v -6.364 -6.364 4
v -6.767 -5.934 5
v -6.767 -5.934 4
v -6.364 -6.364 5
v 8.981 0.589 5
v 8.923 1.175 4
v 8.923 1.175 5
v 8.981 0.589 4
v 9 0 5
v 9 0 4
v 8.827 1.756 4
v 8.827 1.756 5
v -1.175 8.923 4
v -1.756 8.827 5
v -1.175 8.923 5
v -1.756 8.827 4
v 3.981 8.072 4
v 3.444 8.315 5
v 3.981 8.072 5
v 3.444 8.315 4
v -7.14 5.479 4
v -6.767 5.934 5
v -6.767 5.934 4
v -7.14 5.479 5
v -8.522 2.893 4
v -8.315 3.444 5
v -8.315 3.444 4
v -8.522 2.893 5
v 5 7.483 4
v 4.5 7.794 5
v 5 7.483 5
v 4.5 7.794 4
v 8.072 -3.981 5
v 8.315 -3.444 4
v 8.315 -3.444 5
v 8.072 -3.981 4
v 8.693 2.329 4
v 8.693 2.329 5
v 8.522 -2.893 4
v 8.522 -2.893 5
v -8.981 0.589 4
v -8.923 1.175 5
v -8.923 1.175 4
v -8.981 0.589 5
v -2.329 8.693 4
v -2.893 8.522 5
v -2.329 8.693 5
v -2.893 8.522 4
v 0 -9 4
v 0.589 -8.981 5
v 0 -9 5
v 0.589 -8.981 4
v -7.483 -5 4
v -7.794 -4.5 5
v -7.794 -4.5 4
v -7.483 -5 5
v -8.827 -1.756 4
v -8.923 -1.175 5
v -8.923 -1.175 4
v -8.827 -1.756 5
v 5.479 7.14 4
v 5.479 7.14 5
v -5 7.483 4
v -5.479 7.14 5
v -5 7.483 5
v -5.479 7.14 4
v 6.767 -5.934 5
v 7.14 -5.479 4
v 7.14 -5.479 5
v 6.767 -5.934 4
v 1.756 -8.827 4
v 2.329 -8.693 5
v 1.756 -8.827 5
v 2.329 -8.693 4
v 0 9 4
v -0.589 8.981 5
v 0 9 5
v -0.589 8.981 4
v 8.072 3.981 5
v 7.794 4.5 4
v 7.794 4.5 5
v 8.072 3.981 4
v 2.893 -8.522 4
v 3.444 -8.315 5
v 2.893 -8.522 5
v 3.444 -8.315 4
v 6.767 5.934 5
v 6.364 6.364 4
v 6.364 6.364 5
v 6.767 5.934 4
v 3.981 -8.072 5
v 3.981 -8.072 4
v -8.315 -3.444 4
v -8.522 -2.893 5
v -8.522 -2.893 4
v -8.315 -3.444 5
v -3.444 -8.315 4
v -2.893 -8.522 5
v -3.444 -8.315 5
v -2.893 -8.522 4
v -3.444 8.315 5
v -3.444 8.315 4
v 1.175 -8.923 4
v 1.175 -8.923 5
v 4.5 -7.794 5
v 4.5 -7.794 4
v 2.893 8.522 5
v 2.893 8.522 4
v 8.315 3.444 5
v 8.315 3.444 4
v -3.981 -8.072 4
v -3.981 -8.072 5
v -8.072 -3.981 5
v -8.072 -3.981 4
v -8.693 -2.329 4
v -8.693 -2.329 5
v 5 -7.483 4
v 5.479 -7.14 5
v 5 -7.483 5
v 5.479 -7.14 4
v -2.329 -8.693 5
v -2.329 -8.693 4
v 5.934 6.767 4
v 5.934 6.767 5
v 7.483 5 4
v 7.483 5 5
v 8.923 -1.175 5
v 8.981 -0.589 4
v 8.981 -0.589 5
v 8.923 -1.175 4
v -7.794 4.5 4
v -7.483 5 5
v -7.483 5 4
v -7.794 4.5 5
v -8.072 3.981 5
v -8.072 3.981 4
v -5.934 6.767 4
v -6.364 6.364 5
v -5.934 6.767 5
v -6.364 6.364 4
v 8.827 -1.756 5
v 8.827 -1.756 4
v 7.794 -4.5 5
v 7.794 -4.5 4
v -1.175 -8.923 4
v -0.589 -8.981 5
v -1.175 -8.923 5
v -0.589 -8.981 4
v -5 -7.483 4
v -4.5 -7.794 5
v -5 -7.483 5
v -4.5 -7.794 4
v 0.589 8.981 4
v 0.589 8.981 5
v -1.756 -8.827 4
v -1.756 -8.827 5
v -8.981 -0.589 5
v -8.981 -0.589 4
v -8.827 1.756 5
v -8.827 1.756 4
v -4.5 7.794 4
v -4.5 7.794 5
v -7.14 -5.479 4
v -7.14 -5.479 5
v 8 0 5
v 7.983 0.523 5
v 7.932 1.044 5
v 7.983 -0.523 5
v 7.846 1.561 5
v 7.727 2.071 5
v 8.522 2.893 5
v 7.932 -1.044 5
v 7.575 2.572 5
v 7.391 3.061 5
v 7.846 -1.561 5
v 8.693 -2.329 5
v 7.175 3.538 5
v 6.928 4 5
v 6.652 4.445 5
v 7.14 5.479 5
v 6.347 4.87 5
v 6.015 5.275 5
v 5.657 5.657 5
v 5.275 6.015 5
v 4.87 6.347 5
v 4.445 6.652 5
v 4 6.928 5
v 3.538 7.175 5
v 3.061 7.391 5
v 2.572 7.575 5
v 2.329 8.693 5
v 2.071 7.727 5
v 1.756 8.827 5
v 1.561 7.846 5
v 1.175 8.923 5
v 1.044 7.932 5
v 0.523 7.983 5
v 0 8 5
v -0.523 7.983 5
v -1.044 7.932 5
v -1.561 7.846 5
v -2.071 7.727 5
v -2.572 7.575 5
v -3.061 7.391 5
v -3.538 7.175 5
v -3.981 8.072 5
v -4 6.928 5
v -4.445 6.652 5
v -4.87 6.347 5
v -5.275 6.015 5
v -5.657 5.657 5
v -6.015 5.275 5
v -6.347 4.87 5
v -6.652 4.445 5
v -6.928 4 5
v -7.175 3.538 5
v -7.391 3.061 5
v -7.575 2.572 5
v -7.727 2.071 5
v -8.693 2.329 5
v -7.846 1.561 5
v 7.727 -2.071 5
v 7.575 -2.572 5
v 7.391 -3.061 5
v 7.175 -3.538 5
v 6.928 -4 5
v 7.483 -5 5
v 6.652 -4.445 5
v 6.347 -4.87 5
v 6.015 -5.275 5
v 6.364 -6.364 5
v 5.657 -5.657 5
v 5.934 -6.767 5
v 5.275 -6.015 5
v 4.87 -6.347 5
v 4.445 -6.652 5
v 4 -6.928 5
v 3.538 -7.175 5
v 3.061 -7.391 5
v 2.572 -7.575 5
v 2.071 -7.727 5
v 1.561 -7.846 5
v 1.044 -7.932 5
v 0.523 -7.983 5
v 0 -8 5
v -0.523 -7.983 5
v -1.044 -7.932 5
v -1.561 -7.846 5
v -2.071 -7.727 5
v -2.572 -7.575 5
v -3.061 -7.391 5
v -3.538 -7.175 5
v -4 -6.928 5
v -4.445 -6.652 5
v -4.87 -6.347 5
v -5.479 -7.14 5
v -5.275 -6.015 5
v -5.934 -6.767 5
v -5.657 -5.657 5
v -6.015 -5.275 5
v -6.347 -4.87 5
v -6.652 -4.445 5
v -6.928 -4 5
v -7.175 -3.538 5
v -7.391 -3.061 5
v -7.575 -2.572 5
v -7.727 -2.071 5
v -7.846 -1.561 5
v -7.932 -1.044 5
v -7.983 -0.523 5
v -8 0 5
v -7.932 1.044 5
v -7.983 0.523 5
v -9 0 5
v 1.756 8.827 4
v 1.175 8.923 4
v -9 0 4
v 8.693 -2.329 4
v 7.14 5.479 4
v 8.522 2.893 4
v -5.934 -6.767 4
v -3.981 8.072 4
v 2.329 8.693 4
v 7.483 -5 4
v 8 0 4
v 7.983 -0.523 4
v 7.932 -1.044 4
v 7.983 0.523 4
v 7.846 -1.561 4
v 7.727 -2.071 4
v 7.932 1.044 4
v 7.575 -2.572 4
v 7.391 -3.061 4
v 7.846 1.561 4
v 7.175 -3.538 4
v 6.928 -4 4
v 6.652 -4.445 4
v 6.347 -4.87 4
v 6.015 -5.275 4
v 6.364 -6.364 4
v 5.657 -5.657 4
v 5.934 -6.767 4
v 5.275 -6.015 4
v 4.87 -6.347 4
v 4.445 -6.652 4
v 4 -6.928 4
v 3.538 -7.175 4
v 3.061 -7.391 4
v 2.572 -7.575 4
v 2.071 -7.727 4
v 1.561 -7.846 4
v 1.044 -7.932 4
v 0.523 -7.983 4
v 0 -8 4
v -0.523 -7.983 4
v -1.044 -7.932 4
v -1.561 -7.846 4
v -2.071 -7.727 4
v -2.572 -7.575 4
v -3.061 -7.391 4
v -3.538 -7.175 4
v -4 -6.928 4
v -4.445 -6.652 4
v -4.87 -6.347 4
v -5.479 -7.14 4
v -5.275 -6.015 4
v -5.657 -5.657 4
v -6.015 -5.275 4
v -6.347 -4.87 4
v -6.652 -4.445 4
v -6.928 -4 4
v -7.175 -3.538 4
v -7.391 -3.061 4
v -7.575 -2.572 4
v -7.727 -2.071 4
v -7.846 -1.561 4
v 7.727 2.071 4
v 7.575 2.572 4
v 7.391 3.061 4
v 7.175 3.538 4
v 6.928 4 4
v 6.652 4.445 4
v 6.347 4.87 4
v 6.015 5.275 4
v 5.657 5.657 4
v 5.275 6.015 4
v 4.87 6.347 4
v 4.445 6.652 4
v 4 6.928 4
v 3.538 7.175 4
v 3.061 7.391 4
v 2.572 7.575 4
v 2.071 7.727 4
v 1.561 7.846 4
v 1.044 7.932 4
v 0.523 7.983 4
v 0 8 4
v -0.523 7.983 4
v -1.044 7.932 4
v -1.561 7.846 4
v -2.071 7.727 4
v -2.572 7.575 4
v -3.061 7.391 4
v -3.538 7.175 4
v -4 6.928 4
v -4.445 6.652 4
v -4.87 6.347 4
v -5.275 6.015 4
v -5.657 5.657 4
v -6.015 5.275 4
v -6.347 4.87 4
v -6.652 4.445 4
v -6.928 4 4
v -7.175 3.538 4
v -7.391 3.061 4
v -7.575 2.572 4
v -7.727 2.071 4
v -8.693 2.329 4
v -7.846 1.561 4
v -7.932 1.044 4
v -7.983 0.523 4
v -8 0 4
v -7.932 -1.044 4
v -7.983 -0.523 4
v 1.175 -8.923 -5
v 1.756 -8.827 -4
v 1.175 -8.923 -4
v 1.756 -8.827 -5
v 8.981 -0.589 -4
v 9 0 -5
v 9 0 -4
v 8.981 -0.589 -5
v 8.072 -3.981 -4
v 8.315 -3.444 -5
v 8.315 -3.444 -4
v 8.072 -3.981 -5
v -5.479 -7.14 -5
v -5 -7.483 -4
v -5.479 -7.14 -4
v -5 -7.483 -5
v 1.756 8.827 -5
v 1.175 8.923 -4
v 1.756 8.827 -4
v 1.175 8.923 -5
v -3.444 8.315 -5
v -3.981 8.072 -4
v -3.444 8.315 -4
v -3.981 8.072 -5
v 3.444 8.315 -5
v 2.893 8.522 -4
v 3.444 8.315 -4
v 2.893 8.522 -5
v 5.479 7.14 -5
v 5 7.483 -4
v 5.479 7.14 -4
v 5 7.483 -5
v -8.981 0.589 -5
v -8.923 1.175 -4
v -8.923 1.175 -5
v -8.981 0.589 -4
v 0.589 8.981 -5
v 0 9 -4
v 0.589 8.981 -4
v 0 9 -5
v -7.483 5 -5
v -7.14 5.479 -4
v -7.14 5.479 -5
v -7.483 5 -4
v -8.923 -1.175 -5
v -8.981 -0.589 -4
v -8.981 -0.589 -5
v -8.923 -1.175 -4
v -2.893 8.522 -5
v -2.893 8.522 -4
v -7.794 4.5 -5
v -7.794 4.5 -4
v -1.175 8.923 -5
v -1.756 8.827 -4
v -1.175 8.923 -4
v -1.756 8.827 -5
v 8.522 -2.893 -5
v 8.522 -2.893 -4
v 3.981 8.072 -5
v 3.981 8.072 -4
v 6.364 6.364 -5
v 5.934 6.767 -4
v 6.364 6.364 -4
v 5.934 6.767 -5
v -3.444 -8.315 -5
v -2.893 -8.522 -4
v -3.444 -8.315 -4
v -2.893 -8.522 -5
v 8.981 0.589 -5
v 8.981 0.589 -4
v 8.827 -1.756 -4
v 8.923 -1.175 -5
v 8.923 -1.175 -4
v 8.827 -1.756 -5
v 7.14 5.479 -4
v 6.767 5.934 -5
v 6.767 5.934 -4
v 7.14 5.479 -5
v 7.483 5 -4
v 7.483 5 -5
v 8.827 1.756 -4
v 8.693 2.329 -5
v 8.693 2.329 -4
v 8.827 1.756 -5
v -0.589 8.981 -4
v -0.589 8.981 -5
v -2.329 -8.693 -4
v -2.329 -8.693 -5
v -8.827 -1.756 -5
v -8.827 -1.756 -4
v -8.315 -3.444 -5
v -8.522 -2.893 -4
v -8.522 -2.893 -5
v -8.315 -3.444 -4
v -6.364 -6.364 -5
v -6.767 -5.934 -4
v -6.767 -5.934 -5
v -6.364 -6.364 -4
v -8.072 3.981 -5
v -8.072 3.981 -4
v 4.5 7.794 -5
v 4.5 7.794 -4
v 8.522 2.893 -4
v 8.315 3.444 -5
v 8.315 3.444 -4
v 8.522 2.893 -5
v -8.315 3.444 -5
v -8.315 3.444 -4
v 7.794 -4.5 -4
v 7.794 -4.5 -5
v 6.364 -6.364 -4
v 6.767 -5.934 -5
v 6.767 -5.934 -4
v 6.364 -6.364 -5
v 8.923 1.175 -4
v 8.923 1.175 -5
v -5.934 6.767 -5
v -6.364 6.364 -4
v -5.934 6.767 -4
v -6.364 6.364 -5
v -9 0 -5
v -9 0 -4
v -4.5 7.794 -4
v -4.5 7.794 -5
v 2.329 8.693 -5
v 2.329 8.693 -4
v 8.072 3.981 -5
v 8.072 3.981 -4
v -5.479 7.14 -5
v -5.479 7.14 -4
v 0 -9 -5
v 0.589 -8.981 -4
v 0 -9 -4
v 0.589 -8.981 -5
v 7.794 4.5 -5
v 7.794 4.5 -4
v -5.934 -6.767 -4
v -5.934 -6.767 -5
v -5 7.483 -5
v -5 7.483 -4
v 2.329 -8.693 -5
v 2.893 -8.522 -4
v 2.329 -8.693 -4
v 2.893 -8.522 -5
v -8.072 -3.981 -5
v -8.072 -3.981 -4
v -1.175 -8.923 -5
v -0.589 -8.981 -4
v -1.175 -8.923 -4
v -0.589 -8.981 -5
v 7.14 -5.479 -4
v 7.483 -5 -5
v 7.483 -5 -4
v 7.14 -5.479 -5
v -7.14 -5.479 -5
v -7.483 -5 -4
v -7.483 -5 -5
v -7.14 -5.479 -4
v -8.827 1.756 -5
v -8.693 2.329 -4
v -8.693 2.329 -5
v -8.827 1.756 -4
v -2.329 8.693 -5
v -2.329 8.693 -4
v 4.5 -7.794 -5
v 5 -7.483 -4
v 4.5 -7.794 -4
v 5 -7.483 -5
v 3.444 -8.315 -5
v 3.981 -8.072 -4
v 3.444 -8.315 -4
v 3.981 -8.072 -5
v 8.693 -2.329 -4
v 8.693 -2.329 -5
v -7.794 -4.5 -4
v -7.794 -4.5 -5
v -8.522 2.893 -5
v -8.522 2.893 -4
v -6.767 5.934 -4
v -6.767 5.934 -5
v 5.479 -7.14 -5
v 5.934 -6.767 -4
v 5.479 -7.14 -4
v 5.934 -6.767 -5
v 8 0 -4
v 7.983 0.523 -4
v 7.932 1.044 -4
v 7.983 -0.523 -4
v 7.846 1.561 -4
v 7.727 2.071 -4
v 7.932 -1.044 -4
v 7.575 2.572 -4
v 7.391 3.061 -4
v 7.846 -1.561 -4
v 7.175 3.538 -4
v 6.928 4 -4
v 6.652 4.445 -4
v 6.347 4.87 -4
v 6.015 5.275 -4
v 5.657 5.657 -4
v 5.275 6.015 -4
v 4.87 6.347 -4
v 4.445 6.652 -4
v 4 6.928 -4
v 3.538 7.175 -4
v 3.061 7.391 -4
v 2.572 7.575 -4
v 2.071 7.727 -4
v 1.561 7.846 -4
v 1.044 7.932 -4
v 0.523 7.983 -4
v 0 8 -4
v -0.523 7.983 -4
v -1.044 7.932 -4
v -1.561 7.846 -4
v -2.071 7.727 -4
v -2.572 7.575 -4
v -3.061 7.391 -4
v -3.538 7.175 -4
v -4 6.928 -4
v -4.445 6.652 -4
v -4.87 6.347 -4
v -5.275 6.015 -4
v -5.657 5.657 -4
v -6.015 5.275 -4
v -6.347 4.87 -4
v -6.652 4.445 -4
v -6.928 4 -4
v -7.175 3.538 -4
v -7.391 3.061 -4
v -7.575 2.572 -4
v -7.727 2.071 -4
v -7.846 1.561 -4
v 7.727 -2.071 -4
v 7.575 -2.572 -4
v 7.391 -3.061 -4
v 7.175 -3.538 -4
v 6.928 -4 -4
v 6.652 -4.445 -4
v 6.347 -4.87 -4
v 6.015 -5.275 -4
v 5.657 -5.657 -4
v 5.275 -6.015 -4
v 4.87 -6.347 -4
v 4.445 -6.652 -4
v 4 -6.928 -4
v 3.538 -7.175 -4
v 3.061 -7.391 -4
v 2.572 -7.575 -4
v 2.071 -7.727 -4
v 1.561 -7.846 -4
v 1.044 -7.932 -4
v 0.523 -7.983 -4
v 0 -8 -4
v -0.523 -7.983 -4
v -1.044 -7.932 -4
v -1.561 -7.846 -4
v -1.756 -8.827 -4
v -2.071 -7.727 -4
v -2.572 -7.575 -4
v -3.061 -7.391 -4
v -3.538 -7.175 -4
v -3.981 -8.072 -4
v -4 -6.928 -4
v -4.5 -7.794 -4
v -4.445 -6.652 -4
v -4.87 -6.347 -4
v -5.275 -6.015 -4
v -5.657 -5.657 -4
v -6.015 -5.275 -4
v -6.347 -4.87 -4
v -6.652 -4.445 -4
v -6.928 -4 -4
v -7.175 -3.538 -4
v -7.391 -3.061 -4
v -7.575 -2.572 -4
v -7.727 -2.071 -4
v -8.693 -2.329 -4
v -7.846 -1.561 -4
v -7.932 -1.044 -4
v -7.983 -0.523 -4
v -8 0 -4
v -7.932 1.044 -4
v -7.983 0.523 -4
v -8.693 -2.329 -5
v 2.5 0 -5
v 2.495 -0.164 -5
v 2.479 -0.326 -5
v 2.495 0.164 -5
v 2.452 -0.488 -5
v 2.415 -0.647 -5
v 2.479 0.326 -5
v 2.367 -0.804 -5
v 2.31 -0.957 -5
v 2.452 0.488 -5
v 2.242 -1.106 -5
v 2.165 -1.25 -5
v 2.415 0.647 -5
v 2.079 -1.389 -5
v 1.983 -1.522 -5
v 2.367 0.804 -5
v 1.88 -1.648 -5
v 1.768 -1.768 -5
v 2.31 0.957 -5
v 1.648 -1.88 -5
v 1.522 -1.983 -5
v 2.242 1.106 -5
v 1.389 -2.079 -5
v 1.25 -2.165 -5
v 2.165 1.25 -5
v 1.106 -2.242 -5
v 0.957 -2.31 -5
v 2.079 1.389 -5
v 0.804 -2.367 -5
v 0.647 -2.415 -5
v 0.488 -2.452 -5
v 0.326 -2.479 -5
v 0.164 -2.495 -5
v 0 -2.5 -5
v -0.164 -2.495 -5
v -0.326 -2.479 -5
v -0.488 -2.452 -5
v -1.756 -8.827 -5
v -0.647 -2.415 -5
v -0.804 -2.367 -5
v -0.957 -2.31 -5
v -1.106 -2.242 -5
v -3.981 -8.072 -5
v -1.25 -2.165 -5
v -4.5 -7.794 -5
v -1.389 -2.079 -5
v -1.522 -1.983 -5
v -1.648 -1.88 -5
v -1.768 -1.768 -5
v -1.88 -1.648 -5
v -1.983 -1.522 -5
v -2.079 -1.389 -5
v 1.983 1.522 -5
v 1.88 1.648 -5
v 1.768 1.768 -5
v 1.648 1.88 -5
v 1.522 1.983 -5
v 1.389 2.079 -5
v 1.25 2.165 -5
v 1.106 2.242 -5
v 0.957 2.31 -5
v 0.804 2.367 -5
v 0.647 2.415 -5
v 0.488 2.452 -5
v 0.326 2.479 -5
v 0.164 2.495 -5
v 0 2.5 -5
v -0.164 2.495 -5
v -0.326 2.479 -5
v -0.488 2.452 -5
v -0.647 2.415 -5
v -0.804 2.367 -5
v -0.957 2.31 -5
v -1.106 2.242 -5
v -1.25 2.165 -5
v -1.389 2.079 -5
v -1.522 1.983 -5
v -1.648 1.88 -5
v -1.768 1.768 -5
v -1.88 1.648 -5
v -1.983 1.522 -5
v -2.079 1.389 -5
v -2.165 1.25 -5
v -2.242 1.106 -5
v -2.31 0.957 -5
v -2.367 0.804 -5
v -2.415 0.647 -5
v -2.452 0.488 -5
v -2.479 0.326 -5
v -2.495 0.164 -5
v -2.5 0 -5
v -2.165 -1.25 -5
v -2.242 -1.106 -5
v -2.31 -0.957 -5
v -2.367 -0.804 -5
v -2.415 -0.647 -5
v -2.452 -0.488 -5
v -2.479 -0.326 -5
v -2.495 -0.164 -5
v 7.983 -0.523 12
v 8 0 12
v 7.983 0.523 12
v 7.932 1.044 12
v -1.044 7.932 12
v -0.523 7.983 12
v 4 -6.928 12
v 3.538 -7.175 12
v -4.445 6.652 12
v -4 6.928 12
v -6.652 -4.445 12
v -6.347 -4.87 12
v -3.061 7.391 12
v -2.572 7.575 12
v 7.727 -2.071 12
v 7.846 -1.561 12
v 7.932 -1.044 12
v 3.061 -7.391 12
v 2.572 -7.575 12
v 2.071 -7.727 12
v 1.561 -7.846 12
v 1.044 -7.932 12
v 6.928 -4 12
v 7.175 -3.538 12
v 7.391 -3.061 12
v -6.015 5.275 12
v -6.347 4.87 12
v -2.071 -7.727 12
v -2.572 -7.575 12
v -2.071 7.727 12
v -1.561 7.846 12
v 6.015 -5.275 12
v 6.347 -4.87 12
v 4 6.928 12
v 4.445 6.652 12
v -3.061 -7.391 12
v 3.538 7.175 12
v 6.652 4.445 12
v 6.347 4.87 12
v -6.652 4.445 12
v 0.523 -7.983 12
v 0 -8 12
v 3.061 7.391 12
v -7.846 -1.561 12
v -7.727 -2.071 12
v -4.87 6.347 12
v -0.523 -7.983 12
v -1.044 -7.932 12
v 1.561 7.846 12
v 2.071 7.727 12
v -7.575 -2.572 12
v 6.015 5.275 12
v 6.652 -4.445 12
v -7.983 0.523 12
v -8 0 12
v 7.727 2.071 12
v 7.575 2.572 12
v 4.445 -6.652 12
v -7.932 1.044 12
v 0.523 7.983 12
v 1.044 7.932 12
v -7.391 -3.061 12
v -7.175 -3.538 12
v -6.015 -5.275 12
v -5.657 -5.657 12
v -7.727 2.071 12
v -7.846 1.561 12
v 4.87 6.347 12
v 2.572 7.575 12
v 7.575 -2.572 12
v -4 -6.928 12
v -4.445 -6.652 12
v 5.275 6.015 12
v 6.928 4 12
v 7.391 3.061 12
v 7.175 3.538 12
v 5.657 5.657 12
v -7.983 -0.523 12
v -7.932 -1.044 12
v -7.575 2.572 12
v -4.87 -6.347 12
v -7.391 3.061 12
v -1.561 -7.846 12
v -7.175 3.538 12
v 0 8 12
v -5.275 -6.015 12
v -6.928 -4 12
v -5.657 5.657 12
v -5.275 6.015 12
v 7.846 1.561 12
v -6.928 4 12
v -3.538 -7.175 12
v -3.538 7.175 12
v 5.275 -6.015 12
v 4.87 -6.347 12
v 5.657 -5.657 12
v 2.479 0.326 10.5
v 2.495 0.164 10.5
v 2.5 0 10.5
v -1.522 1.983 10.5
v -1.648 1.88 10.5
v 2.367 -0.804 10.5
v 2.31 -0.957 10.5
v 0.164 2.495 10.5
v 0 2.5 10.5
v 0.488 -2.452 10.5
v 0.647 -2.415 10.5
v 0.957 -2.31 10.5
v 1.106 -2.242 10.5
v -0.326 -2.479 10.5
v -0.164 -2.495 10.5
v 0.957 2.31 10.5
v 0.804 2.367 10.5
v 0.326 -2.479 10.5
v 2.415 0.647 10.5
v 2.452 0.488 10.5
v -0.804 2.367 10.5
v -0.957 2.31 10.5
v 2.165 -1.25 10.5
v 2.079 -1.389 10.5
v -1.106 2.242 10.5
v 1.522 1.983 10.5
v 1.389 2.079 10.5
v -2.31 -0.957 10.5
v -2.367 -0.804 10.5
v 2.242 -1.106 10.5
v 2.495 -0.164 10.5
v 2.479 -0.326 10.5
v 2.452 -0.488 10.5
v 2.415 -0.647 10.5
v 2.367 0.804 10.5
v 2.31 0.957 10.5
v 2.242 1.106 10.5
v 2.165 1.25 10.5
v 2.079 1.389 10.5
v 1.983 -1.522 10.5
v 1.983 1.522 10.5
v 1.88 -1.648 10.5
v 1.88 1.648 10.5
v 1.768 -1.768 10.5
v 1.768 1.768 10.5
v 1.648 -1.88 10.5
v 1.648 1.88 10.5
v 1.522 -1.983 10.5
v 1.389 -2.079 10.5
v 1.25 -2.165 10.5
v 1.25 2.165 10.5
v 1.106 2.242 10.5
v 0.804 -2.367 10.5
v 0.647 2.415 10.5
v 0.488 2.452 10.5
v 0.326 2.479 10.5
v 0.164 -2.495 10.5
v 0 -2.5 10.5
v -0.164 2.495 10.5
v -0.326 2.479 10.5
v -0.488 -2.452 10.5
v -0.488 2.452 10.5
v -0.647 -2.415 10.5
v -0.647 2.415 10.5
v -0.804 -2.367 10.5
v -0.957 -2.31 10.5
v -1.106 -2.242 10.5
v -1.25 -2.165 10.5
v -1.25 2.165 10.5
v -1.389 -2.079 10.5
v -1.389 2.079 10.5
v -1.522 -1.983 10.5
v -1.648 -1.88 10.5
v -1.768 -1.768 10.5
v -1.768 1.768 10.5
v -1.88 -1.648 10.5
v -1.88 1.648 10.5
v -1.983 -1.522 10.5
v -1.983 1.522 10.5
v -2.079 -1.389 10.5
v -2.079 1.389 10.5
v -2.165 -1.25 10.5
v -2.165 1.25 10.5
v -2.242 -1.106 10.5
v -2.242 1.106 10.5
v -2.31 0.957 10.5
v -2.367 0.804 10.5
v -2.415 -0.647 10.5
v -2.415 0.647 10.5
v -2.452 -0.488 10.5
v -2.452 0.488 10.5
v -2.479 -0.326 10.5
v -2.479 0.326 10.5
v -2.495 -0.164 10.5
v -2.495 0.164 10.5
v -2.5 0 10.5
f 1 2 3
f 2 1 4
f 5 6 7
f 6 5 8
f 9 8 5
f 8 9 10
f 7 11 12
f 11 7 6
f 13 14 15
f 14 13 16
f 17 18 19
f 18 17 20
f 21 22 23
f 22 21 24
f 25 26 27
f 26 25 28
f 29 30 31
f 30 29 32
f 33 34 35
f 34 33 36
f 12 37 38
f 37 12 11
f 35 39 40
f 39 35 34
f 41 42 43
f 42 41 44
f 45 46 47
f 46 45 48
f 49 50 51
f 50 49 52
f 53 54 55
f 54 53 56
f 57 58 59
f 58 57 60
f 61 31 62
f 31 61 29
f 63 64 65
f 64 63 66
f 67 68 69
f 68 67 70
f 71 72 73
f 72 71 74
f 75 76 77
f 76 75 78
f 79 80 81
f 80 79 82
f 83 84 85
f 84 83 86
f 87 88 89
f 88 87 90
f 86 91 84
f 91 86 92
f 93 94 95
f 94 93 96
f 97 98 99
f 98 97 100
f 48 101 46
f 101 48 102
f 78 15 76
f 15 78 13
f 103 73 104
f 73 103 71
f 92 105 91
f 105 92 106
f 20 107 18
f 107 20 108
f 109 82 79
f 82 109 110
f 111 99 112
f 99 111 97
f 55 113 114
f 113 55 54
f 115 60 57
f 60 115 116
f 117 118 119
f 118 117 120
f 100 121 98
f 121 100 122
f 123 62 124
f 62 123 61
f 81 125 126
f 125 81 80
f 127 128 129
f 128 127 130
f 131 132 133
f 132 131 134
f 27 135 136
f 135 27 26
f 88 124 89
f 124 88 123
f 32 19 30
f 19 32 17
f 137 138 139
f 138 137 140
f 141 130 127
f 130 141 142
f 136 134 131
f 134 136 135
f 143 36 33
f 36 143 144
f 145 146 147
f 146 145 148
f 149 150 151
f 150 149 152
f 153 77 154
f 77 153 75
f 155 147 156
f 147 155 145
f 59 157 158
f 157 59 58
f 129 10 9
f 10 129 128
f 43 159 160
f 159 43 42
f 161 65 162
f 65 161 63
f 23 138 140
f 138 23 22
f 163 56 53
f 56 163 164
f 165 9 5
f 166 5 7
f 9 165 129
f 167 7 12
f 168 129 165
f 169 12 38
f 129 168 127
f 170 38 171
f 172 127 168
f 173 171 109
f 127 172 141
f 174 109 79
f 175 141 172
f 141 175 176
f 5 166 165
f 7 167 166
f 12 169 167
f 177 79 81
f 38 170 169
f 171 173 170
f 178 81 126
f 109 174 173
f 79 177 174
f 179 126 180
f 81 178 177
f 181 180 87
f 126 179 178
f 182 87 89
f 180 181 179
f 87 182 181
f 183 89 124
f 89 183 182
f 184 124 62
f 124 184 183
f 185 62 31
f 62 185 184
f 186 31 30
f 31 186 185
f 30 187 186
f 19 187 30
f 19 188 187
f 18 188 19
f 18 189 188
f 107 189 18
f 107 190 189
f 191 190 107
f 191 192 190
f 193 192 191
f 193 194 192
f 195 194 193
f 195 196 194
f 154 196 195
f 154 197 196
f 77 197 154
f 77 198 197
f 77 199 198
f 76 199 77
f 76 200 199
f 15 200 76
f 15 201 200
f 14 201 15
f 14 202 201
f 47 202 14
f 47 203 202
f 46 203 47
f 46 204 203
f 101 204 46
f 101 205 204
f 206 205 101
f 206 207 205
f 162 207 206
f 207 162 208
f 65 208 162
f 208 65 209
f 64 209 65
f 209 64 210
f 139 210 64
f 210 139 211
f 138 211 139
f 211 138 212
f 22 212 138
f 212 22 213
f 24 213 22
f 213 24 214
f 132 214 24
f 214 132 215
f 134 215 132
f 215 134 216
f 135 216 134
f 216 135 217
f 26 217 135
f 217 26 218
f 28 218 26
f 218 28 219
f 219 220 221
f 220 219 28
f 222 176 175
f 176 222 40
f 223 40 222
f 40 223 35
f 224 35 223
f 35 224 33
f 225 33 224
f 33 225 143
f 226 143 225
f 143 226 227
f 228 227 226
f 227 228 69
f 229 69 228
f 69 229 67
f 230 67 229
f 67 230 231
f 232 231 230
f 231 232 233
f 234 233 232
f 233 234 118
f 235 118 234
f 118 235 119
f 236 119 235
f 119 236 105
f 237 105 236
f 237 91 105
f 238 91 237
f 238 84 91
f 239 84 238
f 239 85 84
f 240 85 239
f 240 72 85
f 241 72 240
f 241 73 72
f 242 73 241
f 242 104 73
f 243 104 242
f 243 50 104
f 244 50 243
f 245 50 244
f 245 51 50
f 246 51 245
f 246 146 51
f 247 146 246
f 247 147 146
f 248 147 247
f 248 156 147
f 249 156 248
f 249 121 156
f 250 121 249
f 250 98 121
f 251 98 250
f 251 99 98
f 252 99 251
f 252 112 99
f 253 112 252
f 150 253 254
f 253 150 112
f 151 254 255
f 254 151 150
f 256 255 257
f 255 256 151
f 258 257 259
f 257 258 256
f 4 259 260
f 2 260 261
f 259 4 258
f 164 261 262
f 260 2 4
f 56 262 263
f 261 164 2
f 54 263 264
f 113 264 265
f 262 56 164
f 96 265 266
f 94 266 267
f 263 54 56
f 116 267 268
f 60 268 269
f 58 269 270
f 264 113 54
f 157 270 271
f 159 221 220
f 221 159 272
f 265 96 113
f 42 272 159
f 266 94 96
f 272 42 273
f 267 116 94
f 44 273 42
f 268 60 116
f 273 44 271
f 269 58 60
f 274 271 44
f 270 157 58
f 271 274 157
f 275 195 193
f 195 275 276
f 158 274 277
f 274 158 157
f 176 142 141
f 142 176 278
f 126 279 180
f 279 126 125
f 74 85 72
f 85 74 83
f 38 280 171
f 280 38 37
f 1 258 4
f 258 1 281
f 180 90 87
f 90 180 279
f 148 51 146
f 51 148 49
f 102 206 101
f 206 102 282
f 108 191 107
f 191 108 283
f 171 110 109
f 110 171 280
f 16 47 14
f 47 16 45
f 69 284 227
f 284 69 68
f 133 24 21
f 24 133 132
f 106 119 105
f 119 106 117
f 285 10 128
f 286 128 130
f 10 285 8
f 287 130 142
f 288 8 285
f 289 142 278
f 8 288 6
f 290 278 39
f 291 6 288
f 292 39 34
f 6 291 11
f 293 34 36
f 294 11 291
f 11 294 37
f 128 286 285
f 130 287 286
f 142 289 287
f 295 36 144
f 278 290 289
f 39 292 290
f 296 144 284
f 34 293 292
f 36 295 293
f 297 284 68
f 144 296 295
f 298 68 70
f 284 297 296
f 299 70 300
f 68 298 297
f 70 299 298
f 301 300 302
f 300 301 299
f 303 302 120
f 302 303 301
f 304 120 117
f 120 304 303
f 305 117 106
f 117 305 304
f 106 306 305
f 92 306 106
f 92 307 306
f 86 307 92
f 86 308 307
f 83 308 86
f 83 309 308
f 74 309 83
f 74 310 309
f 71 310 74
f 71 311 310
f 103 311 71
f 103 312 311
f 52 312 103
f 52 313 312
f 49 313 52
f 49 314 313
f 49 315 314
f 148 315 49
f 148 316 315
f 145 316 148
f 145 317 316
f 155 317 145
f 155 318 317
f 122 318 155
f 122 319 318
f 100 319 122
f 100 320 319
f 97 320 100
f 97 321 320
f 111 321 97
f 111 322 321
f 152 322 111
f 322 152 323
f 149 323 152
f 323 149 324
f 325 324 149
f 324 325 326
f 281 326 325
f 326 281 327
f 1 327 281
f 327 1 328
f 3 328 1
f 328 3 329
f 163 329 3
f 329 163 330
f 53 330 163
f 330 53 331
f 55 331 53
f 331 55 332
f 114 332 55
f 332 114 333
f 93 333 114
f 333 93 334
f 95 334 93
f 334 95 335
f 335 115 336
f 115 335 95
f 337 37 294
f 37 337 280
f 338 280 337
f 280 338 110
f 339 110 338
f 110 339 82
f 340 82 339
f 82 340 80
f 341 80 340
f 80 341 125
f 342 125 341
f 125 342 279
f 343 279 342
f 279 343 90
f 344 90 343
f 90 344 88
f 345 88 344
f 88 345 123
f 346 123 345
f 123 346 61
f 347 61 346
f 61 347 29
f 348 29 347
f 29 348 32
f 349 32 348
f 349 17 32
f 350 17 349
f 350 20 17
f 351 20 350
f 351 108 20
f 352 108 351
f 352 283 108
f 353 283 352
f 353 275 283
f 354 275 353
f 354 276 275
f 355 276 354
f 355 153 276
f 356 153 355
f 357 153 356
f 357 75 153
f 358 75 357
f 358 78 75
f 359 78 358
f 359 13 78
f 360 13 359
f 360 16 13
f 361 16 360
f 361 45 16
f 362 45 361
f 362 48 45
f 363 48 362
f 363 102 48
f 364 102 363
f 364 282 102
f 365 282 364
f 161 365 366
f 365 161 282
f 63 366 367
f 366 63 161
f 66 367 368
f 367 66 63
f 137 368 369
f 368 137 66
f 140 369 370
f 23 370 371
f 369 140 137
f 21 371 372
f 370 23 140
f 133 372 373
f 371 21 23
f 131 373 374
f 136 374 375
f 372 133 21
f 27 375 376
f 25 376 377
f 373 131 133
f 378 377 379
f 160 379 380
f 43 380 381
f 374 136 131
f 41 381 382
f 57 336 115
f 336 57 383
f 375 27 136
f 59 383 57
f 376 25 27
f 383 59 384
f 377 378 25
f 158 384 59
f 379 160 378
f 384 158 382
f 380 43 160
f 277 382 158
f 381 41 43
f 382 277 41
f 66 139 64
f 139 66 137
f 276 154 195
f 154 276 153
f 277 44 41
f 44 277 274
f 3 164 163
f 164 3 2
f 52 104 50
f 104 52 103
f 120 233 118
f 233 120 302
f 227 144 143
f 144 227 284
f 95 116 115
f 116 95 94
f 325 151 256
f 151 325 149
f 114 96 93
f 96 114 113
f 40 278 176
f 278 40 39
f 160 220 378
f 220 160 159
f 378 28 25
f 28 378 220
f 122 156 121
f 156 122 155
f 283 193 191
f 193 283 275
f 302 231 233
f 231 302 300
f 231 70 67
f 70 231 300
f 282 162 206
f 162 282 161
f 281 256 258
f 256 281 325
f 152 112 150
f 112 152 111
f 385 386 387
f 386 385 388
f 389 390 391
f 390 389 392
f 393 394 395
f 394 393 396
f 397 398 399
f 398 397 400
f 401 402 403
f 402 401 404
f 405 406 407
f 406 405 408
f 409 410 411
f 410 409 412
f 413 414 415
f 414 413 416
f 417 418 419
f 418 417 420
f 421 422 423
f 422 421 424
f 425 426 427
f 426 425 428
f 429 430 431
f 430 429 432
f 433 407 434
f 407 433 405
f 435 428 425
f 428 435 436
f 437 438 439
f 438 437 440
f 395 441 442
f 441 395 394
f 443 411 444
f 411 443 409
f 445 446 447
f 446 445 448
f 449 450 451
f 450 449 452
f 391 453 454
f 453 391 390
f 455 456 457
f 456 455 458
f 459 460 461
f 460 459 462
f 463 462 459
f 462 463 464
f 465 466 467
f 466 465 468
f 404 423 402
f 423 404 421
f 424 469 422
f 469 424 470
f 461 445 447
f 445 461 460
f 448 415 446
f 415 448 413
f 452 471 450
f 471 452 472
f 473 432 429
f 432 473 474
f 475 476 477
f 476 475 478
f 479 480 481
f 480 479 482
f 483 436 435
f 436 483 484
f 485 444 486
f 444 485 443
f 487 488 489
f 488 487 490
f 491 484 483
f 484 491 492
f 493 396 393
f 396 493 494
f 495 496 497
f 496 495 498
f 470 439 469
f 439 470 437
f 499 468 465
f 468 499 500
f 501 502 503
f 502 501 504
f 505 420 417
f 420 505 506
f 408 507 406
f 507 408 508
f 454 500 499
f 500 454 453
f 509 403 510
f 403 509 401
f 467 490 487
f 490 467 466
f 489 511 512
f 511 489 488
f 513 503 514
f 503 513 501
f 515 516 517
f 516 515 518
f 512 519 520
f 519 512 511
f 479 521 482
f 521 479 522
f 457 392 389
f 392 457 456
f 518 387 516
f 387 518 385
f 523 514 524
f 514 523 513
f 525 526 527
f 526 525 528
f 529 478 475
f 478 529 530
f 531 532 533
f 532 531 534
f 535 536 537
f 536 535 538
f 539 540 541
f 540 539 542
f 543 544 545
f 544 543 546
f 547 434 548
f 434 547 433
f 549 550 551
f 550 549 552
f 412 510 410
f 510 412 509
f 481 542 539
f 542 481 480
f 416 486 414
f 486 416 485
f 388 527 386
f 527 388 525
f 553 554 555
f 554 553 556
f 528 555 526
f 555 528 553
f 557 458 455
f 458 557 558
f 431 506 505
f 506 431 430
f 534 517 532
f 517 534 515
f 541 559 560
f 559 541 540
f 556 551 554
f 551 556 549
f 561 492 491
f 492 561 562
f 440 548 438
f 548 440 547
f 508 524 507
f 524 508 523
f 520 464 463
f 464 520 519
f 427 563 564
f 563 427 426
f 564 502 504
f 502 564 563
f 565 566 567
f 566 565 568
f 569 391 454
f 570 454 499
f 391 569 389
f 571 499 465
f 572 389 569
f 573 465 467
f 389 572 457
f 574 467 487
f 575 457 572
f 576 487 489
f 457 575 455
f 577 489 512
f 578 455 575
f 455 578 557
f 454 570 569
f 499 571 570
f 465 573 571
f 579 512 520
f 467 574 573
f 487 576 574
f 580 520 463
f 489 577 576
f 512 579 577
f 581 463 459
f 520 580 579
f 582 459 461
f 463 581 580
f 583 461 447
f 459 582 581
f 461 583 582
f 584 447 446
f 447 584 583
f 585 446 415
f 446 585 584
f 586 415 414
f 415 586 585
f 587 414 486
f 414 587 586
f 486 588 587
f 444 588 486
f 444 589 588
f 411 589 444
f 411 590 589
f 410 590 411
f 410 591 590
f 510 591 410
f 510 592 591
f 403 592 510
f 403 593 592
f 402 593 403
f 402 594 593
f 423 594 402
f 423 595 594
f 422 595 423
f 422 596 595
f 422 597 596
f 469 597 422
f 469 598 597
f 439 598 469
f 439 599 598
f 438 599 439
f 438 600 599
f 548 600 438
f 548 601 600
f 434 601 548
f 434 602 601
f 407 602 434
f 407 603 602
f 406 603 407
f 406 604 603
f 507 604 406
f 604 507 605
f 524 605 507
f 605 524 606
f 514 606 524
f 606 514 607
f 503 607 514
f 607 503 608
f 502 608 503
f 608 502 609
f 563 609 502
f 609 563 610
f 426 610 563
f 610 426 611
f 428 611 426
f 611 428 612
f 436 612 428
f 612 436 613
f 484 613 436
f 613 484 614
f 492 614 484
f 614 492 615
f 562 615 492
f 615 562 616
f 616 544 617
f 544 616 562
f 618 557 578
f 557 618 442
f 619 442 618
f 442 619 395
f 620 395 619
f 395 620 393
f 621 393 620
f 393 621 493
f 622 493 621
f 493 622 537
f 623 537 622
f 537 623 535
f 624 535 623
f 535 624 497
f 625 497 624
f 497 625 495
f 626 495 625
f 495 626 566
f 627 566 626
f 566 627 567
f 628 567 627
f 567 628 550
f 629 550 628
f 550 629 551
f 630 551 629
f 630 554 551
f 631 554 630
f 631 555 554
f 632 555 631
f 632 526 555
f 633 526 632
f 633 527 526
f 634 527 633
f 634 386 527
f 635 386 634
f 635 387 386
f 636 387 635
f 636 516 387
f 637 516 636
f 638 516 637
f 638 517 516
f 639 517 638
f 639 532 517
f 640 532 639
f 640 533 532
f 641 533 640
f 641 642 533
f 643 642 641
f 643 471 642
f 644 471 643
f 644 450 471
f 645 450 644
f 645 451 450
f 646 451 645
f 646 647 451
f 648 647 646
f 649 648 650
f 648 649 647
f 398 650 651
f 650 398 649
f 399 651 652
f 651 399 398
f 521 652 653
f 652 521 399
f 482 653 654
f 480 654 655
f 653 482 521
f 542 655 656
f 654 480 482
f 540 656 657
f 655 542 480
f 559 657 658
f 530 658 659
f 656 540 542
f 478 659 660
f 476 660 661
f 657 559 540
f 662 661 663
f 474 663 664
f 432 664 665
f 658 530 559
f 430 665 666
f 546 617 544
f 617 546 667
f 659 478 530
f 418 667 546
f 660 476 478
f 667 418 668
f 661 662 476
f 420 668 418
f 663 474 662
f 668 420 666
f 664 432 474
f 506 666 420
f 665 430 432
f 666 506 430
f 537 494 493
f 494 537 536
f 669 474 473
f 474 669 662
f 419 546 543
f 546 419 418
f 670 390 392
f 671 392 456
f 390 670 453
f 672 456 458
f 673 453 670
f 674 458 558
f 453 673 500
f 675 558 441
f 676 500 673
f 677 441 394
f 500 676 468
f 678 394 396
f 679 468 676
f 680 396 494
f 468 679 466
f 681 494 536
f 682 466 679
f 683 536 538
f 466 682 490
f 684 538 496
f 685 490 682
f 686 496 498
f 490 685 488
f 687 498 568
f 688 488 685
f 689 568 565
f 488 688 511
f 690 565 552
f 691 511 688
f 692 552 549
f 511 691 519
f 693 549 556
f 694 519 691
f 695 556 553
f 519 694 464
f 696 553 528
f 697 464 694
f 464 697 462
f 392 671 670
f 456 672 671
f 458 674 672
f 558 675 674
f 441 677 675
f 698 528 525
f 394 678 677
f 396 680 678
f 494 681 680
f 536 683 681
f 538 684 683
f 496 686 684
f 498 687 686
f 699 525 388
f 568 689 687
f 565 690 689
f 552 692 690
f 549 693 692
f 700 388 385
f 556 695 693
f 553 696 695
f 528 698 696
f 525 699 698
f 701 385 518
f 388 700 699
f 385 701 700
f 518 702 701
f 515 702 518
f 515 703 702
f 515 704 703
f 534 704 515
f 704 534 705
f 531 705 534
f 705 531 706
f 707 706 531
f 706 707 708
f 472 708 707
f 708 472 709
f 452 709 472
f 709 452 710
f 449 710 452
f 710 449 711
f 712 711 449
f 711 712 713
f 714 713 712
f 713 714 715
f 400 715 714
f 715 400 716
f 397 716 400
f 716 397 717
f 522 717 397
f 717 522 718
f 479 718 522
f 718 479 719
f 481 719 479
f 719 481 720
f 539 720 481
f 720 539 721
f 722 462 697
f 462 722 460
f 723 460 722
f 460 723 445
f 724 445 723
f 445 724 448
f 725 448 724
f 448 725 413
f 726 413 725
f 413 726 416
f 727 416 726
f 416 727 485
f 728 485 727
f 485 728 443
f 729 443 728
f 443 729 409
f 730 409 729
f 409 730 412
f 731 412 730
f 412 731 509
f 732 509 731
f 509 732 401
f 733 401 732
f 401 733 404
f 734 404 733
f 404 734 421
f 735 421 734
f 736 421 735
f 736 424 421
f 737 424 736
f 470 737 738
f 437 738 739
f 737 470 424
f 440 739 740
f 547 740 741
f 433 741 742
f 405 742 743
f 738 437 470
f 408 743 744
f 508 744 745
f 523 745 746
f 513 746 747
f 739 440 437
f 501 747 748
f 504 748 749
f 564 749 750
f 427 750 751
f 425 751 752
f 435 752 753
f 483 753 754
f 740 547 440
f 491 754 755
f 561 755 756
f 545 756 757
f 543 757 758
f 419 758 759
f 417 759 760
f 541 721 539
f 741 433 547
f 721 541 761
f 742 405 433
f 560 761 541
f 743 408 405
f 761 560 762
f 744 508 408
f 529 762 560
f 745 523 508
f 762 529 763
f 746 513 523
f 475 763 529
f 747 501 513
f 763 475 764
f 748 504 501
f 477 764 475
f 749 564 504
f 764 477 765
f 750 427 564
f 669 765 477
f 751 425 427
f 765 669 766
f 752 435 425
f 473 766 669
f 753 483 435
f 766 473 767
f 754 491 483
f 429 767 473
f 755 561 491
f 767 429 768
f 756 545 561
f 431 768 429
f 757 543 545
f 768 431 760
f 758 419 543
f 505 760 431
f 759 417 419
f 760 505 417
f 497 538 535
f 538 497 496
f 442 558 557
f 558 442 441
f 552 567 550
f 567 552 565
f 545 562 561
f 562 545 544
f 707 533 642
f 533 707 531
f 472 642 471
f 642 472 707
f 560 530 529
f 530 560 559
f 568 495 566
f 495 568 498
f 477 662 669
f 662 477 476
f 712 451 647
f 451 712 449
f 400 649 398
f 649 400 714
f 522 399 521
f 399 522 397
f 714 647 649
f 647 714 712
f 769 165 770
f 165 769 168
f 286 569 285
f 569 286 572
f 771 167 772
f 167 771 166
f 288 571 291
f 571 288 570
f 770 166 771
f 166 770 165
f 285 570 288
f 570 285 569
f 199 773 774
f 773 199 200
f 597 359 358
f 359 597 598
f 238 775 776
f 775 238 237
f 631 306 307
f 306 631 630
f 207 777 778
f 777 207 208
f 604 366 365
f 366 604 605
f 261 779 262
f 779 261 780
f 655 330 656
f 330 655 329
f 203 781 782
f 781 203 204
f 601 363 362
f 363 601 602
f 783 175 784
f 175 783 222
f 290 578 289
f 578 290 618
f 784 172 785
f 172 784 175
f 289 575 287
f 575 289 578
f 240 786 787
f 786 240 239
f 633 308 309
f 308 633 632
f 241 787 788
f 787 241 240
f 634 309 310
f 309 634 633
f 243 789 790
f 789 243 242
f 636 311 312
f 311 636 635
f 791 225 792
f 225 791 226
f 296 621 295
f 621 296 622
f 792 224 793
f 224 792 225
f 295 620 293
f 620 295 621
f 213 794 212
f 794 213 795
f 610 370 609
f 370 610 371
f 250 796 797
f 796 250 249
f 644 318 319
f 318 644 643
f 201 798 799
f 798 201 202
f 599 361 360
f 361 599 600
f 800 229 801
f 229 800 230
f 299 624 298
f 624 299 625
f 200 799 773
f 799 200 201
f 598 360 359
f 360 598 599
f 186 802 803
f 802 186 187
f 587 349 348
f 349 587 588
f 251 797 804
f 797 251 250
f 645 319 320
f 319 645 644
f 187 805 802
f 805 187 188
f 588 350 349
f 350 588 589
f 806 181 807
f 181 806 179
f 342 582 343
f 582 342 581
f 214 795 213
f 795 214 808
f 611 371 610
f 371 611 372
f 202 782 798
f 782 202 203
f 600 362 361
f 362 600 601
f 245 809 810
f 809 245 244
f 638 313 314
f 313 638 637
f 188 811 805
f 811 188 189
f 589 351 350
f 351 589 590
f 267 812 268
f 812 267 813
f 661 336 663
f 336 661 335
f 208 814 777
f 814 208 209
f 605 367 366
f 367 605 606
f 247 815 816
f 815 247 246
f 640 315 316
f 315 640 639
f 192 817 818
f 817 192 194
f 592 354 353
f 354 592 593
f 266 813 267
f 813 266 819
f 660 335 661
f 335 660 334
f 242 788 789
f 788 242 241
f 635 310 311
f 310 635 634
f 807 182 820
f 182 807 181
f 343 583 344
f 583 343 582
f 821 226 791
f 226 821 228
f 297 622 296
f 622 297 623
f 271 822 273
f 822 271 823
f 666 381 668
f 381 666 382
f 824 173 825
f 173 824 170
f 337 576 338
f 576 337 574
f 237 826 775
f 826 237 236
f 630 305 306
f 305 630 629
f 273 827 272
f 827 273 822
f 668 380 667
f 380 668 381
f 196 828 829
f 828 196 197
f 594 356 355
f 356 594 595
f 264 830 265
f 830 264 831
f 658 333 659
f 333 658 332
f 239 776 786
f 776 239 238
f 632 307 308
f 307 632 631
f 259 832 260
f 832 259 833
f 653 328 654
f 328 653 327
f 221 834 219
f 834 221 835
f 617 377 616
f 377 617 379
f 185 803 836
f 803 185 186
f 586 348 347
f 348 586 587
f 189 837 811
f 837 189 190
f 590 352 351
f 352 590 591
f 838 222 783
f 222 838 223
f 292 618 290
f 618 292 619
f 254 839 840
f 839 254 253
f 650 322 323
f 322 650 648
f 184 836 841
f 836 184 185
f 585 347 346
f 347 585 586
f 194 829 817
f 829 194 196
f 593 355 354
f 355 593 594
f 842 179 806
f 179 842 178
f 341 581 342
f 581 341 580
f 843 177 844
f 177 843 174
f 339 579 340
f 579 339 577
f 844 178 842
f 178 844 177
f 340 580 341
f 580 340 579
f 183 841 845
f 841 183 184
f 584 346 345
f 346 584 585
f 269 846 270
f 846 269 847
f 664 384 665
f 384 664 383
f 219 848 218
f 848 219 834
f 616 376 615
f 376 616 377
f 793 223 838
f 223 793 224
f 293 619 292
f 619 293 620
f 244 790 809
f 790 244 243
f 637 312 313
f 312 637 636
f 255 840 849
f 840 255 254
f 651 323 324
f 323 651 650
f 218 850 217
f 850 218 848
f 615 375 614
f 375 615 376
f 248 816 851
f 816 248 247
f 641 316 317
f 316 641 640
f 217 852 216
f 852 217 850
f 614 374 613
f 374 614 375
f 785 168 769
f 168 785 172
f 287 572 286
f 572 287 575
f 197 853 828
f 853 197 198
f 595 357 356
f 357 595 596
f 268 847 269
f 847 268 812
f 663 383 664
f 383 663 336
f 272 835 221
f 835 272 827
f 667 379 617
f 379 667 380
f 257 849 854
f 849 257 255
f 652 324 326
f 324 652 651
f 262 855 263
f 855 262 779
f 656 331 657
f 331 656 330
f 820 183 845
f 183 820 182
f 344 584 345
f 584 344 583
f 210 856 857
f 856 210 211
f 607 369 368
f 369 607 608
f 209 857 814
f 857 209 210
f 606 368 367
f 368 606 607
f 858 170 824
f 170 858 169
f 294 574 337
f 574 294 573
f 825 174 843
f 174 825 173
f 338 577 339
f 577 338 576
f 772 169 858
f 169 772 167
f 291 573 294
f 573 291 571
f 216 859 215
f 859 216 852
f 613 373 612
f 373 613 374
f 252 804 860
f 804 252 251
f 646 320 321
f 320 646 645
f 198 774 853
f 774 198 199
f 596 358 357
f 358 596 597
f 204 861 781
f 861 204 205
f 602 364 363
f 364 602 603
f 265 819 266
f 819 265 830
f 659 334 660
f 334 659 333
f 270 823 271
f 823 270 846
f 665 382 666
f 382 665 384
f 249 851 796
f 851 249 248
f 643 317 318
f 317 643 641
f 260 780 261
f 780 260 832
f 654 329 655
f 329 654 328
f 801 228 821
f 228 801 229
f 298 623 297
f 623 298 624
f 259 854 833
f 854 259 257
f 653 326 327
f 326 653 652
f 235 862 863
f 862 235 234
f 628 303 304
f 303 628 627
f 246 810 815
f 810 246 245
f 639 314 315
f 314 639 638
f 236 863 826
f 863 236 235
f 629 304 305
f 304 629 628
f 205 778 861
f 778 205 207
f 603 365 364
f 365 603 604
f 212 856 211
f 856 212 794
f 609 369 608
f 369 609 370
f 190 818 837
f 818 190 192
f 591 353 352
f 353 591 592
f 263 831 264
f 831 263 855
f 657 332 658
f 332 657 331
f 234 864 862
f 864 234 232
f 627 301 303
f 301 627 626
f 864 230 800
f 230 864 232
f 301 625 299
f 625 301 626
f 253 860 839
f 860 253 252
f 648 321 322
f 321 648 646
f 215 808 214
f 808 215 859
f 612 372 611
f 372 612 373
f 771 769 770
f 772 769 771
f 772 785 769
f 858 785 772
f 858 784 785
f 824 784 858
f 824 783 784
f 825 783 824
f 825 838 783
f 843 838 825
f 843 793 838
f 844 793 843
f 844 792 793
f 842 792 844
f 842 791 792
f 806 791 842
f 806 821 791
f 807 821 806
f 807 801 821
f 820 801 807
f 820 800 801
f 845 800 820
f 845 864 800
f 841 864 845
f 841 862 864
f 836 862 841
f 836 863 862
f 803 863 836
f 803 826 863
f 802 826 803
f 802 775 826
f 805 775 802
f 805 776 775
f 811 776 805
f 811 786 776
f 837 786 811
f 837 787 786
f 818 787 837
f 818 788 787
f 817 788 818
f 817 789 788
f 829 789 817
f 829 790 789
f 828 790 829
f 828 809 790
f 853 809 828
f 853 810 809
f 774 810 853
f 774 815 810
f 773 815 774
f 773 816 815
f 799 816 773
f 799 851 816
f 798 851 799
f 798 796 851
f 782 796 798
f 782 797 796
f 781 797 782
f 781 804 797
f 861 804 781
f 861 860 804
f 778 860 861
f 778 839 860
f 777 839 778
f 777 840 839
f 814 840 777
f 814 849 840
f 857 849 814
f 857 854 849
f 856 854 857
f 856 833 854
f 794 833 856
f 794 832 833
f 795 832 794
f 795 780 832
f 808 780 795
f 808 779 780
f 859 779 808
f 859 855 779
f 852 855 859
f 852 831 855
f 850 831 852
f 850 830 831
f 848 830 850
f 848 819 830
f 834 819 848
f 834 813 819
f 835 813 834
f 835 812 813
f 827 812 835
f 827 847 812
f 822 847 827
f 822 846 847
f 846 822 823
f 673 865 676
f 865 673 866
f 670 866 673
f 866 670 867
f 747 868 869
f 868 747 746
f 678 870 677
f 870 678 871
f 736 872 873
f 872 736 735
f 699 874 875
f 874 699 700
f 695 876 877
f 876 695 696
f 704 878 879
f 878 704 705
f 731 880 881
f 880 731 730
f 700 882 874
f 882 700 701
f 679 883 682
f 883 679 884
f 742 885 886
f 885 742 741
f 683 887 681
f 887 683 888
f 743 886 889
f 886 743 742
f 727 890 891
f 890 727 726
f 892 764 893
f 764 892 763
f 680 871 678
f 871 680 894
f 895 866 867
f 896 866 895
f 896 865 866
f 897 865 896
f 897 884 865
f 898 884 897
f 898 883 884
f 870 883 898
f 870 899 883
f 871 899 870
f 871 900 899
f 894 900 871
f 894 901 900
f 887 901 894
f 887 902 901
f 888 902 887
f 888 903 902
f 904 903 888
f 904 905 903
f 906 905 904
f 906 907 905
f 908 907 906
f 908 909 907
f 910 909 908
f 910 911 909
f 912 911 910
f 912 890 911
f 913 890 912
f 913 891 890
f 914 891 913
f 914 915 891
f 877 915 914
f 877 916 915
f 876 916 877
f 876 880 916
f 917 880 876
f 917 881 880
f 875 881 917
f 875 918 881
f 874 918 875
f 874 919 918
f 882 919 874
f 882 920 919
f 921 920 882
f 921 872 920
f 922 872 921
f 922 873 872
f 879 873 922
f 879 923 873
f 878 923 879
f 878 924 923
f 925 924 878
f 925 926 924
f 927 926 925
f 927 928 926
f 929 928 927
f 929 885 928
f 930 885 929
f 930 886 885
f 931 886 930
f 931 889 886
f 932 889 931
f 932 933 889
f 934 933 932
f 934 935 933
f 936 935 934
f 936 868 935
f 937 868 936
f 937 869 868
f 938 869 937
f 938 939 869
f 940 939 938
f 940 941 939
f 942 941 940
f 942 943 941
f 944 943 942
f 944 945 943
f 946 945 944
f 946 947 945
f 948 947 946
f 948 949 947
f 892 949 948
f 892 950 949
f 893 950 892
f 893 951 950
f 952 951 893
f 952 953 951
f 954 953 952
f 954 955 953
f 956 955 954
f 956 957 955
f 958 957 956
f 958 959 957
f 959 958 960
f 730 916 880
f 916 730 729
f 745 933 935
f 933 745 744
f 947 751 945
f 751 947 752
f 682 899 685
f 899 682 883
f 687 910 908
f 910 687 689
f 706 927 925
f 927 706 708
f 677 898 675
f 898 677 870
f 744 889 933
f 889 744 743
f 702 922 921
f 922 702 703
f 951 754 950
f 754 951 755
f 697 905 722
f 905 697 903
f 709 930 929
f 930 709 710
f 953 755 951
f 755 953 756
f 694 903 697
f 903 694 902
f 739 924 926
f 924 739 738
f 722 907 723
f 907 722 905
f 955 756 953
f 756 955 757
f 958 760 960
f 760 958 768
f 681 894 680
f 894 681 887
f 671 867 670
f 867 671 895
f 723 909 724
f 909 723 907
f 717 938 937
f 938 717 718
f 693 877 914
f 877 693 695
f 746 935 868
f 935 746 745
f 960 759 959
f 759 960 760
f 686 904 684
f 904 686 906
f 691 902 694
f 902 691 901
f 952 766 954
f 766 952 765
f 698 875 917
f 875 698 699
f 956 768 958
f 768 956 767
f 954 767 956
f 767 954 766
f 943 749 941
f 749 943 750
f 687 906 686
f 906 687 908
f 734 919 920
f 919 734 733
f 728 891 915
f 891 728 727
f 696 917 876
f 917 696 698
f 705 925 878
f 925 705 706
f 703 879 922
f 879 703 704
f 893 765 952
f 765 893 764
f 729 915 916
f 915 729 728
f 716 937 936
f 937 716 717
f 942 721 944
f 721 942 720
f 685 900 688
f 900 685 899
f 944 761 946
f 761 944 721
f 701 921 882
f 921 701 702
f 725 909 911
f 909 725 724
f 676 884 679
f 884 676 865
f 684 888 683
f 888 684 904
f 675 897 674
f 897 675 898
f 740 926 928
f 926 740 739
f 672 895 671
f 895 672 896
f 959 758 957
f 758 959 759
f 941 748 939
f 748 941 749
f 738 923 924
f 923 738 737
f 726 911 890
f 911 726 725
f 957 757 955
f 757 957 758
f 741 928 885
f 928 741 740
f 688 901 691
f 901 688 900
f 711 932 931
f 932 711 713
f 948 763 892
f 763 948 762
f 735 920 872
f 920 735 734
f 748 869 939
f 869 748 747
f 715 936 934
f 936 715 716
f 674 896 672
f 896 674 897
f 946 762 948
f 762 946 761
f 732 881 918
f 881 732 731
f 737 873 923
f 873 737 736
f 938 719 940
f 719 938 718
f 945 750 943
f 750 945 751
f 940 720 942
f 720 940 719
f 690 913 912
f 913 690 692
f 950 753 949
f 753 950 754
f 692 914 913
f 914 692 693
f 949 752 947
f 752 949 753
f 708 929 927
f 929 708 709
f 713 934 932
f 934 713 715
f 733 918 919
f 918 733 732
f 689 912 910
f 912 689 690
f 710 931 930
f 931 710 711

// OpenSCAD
// Parameters
pulley_type = 0; //[0:1:1]
teeth_count = 20; //[10:60:1]
outer_diameter_mm = 16; //[8:32:0.5]
belt_pitch_mm = 2; //[1:5:0.1]
width_mm = 10; //[5:30:0.5]
bore_diameter_mm = 5; //[2:12:0.1]
hub_diameter_mm = 12; //[6:24:0.5]
hub_length_mm = 8; //[0:24:0.5]
hub_enabled = 1; //[0:1:1]
flange_diameter_mm = 18; //[10:40:0.5]
flange_thickness_mm = 1; //[0:5:0.1]
flanges_enabled = 1; //[0:1:1]
set_screw_count = 0; //[0:4:1]
set_screw_diameter_mm = 3; //[1:6:0.1]
set_screw_z_offset_mm = 0; //[-10:10:0.5]
overlap_mm = 1; //[0.5:2:0.1]
tooth_height_mm = 1; //[0.5:3:0.1]
tooth_width_factor = 0.6; //[0.3:0.9:0.05]
set_screw_length_mm = 30; //[10:80:1]

$fn = 96;

module pulley() {
  ov = max(0.05, overlap_mm);

  // Base body
  body_r = max(0.1, outer_diameter_mm/2);
  body_h = max(0.1, width_mm);

  // Hub (make sure it is not smaller than body so union stays one solid)
  hub_on = (hub_enabled != 0) && (hub_length_mm > 0) && (hub_diameter_mm > 0);
  hub_r  = max(body_r, hub_diameter_mm/2);
  hub_h  = max(0.1, hub_length_mm);

  // Flanges
  flange_on = (flanges_enabled != 0) && (flange_thickness_mm > 0) && (flange_diameter_mm > 0);
  flange_r  = max(body_r, flange_diameter_mm/2);
  flange_h  = max(0.1, flange_thickness_mm);

  // Teeth
  tooth_on  = (pulley_type == 1) && (teeth_count > 0) && (tooth_height_mm > 0) && (belt_pitch_mm > 0);
  tooth_len = max(0.1, tooth_height_mm + ov);                 // radial length
  tooth_w   = max(0.1, belt_pitch_mm * tooth_width_factor);
  tooth_h   = body_h;

  // Z placement (all formula-based, with overlap to guarantee connectivity)
  hub_z        = body_h/2 + hub_h/2 - ov;
  top_flange_z = body_h/2 + flange_h/2 - ov;
  bot_flange_z = -(body_h/2 + flange_h/2 - ov);

  // Bore through entire assembled height (computed, not arbitrary)
  total_h = body_h
          + (hub_on ? (hub_h - ov) : 0)
          + (flange_on ? 2*(flange_h - ov) : 0);

  bore_r = max(0.1, bore_diameter_mm/2);
  bore_h = total_h + 4*ov;

  difference() {
    union() {
      // Main body
      cylinder(r=body_r, h=body_h, center=true);

      // Hub (connected)
      if (hub_on)
        translate([0, 0, hub_z])
          cylinder(r=hub_r, h=hub_h, center=true);

      // Flanges (connected)
      if (flange_on) {
        translate([0, 0, top_flange_z])
          cylinder(r=flange_r, h=flange_h, center=true);
        translate([0, 0, bot_flange_z])
          cylinder(r=flange_r, h=flange_h, center=true);
      }

      // Teeth (protrude outward, overlap into body)
      if (tooth_on)
        for (i = [0:teeth_count-1])
          rotate([0, 0, i*360/teeth_count])
            translate([body_r + tooth_len/2 - ov, 0, 0])
              cube([tooth_len, tooth_w, tooth_h], center=true);
    }

    // Center bore
    cylinder(r=bore_r, h=bore_h, center=true);

    // Set screw holes (radial, only if hub exists)
    if (hub_on && set_screw_count > 0 && set_screw_diameter_mm > 0) {
      screw_r = max(0.1, set_screw_diameter_mm/2);

      // Clamp screw Z so it always intersects the hub (prevents "no visible geometry" from odd offsets)
      screw_z_raw = hub_z + set_screw_z_offset_mm;
      screw_z_min = hub_z - hub_h/2 + screw_r + ov;
      screw_z_max = hub_z + hub_h/2 - screw_r - ov;
      screw_z = (screw_z_min <= screw_z_max)
              ? min(max(screw_z_raw, screw_z_min), screw_z_max)
              : hub_z;

      // Axis near hub OD, with overlap so it definitely cuts
      screw_axis_x = hub_r - ov;

      for (i = [0:set_screw_count-1])
        rotate([0, 0, i*360/set_screw_count])
          translate([screw_axis_x, 0, screw_z])
            rotate([0, 90, 0])
              cylinder(r=screw_r, h=max(0.1, set_screw_length_mm), center=true);
    }
  }
}

pulley();
